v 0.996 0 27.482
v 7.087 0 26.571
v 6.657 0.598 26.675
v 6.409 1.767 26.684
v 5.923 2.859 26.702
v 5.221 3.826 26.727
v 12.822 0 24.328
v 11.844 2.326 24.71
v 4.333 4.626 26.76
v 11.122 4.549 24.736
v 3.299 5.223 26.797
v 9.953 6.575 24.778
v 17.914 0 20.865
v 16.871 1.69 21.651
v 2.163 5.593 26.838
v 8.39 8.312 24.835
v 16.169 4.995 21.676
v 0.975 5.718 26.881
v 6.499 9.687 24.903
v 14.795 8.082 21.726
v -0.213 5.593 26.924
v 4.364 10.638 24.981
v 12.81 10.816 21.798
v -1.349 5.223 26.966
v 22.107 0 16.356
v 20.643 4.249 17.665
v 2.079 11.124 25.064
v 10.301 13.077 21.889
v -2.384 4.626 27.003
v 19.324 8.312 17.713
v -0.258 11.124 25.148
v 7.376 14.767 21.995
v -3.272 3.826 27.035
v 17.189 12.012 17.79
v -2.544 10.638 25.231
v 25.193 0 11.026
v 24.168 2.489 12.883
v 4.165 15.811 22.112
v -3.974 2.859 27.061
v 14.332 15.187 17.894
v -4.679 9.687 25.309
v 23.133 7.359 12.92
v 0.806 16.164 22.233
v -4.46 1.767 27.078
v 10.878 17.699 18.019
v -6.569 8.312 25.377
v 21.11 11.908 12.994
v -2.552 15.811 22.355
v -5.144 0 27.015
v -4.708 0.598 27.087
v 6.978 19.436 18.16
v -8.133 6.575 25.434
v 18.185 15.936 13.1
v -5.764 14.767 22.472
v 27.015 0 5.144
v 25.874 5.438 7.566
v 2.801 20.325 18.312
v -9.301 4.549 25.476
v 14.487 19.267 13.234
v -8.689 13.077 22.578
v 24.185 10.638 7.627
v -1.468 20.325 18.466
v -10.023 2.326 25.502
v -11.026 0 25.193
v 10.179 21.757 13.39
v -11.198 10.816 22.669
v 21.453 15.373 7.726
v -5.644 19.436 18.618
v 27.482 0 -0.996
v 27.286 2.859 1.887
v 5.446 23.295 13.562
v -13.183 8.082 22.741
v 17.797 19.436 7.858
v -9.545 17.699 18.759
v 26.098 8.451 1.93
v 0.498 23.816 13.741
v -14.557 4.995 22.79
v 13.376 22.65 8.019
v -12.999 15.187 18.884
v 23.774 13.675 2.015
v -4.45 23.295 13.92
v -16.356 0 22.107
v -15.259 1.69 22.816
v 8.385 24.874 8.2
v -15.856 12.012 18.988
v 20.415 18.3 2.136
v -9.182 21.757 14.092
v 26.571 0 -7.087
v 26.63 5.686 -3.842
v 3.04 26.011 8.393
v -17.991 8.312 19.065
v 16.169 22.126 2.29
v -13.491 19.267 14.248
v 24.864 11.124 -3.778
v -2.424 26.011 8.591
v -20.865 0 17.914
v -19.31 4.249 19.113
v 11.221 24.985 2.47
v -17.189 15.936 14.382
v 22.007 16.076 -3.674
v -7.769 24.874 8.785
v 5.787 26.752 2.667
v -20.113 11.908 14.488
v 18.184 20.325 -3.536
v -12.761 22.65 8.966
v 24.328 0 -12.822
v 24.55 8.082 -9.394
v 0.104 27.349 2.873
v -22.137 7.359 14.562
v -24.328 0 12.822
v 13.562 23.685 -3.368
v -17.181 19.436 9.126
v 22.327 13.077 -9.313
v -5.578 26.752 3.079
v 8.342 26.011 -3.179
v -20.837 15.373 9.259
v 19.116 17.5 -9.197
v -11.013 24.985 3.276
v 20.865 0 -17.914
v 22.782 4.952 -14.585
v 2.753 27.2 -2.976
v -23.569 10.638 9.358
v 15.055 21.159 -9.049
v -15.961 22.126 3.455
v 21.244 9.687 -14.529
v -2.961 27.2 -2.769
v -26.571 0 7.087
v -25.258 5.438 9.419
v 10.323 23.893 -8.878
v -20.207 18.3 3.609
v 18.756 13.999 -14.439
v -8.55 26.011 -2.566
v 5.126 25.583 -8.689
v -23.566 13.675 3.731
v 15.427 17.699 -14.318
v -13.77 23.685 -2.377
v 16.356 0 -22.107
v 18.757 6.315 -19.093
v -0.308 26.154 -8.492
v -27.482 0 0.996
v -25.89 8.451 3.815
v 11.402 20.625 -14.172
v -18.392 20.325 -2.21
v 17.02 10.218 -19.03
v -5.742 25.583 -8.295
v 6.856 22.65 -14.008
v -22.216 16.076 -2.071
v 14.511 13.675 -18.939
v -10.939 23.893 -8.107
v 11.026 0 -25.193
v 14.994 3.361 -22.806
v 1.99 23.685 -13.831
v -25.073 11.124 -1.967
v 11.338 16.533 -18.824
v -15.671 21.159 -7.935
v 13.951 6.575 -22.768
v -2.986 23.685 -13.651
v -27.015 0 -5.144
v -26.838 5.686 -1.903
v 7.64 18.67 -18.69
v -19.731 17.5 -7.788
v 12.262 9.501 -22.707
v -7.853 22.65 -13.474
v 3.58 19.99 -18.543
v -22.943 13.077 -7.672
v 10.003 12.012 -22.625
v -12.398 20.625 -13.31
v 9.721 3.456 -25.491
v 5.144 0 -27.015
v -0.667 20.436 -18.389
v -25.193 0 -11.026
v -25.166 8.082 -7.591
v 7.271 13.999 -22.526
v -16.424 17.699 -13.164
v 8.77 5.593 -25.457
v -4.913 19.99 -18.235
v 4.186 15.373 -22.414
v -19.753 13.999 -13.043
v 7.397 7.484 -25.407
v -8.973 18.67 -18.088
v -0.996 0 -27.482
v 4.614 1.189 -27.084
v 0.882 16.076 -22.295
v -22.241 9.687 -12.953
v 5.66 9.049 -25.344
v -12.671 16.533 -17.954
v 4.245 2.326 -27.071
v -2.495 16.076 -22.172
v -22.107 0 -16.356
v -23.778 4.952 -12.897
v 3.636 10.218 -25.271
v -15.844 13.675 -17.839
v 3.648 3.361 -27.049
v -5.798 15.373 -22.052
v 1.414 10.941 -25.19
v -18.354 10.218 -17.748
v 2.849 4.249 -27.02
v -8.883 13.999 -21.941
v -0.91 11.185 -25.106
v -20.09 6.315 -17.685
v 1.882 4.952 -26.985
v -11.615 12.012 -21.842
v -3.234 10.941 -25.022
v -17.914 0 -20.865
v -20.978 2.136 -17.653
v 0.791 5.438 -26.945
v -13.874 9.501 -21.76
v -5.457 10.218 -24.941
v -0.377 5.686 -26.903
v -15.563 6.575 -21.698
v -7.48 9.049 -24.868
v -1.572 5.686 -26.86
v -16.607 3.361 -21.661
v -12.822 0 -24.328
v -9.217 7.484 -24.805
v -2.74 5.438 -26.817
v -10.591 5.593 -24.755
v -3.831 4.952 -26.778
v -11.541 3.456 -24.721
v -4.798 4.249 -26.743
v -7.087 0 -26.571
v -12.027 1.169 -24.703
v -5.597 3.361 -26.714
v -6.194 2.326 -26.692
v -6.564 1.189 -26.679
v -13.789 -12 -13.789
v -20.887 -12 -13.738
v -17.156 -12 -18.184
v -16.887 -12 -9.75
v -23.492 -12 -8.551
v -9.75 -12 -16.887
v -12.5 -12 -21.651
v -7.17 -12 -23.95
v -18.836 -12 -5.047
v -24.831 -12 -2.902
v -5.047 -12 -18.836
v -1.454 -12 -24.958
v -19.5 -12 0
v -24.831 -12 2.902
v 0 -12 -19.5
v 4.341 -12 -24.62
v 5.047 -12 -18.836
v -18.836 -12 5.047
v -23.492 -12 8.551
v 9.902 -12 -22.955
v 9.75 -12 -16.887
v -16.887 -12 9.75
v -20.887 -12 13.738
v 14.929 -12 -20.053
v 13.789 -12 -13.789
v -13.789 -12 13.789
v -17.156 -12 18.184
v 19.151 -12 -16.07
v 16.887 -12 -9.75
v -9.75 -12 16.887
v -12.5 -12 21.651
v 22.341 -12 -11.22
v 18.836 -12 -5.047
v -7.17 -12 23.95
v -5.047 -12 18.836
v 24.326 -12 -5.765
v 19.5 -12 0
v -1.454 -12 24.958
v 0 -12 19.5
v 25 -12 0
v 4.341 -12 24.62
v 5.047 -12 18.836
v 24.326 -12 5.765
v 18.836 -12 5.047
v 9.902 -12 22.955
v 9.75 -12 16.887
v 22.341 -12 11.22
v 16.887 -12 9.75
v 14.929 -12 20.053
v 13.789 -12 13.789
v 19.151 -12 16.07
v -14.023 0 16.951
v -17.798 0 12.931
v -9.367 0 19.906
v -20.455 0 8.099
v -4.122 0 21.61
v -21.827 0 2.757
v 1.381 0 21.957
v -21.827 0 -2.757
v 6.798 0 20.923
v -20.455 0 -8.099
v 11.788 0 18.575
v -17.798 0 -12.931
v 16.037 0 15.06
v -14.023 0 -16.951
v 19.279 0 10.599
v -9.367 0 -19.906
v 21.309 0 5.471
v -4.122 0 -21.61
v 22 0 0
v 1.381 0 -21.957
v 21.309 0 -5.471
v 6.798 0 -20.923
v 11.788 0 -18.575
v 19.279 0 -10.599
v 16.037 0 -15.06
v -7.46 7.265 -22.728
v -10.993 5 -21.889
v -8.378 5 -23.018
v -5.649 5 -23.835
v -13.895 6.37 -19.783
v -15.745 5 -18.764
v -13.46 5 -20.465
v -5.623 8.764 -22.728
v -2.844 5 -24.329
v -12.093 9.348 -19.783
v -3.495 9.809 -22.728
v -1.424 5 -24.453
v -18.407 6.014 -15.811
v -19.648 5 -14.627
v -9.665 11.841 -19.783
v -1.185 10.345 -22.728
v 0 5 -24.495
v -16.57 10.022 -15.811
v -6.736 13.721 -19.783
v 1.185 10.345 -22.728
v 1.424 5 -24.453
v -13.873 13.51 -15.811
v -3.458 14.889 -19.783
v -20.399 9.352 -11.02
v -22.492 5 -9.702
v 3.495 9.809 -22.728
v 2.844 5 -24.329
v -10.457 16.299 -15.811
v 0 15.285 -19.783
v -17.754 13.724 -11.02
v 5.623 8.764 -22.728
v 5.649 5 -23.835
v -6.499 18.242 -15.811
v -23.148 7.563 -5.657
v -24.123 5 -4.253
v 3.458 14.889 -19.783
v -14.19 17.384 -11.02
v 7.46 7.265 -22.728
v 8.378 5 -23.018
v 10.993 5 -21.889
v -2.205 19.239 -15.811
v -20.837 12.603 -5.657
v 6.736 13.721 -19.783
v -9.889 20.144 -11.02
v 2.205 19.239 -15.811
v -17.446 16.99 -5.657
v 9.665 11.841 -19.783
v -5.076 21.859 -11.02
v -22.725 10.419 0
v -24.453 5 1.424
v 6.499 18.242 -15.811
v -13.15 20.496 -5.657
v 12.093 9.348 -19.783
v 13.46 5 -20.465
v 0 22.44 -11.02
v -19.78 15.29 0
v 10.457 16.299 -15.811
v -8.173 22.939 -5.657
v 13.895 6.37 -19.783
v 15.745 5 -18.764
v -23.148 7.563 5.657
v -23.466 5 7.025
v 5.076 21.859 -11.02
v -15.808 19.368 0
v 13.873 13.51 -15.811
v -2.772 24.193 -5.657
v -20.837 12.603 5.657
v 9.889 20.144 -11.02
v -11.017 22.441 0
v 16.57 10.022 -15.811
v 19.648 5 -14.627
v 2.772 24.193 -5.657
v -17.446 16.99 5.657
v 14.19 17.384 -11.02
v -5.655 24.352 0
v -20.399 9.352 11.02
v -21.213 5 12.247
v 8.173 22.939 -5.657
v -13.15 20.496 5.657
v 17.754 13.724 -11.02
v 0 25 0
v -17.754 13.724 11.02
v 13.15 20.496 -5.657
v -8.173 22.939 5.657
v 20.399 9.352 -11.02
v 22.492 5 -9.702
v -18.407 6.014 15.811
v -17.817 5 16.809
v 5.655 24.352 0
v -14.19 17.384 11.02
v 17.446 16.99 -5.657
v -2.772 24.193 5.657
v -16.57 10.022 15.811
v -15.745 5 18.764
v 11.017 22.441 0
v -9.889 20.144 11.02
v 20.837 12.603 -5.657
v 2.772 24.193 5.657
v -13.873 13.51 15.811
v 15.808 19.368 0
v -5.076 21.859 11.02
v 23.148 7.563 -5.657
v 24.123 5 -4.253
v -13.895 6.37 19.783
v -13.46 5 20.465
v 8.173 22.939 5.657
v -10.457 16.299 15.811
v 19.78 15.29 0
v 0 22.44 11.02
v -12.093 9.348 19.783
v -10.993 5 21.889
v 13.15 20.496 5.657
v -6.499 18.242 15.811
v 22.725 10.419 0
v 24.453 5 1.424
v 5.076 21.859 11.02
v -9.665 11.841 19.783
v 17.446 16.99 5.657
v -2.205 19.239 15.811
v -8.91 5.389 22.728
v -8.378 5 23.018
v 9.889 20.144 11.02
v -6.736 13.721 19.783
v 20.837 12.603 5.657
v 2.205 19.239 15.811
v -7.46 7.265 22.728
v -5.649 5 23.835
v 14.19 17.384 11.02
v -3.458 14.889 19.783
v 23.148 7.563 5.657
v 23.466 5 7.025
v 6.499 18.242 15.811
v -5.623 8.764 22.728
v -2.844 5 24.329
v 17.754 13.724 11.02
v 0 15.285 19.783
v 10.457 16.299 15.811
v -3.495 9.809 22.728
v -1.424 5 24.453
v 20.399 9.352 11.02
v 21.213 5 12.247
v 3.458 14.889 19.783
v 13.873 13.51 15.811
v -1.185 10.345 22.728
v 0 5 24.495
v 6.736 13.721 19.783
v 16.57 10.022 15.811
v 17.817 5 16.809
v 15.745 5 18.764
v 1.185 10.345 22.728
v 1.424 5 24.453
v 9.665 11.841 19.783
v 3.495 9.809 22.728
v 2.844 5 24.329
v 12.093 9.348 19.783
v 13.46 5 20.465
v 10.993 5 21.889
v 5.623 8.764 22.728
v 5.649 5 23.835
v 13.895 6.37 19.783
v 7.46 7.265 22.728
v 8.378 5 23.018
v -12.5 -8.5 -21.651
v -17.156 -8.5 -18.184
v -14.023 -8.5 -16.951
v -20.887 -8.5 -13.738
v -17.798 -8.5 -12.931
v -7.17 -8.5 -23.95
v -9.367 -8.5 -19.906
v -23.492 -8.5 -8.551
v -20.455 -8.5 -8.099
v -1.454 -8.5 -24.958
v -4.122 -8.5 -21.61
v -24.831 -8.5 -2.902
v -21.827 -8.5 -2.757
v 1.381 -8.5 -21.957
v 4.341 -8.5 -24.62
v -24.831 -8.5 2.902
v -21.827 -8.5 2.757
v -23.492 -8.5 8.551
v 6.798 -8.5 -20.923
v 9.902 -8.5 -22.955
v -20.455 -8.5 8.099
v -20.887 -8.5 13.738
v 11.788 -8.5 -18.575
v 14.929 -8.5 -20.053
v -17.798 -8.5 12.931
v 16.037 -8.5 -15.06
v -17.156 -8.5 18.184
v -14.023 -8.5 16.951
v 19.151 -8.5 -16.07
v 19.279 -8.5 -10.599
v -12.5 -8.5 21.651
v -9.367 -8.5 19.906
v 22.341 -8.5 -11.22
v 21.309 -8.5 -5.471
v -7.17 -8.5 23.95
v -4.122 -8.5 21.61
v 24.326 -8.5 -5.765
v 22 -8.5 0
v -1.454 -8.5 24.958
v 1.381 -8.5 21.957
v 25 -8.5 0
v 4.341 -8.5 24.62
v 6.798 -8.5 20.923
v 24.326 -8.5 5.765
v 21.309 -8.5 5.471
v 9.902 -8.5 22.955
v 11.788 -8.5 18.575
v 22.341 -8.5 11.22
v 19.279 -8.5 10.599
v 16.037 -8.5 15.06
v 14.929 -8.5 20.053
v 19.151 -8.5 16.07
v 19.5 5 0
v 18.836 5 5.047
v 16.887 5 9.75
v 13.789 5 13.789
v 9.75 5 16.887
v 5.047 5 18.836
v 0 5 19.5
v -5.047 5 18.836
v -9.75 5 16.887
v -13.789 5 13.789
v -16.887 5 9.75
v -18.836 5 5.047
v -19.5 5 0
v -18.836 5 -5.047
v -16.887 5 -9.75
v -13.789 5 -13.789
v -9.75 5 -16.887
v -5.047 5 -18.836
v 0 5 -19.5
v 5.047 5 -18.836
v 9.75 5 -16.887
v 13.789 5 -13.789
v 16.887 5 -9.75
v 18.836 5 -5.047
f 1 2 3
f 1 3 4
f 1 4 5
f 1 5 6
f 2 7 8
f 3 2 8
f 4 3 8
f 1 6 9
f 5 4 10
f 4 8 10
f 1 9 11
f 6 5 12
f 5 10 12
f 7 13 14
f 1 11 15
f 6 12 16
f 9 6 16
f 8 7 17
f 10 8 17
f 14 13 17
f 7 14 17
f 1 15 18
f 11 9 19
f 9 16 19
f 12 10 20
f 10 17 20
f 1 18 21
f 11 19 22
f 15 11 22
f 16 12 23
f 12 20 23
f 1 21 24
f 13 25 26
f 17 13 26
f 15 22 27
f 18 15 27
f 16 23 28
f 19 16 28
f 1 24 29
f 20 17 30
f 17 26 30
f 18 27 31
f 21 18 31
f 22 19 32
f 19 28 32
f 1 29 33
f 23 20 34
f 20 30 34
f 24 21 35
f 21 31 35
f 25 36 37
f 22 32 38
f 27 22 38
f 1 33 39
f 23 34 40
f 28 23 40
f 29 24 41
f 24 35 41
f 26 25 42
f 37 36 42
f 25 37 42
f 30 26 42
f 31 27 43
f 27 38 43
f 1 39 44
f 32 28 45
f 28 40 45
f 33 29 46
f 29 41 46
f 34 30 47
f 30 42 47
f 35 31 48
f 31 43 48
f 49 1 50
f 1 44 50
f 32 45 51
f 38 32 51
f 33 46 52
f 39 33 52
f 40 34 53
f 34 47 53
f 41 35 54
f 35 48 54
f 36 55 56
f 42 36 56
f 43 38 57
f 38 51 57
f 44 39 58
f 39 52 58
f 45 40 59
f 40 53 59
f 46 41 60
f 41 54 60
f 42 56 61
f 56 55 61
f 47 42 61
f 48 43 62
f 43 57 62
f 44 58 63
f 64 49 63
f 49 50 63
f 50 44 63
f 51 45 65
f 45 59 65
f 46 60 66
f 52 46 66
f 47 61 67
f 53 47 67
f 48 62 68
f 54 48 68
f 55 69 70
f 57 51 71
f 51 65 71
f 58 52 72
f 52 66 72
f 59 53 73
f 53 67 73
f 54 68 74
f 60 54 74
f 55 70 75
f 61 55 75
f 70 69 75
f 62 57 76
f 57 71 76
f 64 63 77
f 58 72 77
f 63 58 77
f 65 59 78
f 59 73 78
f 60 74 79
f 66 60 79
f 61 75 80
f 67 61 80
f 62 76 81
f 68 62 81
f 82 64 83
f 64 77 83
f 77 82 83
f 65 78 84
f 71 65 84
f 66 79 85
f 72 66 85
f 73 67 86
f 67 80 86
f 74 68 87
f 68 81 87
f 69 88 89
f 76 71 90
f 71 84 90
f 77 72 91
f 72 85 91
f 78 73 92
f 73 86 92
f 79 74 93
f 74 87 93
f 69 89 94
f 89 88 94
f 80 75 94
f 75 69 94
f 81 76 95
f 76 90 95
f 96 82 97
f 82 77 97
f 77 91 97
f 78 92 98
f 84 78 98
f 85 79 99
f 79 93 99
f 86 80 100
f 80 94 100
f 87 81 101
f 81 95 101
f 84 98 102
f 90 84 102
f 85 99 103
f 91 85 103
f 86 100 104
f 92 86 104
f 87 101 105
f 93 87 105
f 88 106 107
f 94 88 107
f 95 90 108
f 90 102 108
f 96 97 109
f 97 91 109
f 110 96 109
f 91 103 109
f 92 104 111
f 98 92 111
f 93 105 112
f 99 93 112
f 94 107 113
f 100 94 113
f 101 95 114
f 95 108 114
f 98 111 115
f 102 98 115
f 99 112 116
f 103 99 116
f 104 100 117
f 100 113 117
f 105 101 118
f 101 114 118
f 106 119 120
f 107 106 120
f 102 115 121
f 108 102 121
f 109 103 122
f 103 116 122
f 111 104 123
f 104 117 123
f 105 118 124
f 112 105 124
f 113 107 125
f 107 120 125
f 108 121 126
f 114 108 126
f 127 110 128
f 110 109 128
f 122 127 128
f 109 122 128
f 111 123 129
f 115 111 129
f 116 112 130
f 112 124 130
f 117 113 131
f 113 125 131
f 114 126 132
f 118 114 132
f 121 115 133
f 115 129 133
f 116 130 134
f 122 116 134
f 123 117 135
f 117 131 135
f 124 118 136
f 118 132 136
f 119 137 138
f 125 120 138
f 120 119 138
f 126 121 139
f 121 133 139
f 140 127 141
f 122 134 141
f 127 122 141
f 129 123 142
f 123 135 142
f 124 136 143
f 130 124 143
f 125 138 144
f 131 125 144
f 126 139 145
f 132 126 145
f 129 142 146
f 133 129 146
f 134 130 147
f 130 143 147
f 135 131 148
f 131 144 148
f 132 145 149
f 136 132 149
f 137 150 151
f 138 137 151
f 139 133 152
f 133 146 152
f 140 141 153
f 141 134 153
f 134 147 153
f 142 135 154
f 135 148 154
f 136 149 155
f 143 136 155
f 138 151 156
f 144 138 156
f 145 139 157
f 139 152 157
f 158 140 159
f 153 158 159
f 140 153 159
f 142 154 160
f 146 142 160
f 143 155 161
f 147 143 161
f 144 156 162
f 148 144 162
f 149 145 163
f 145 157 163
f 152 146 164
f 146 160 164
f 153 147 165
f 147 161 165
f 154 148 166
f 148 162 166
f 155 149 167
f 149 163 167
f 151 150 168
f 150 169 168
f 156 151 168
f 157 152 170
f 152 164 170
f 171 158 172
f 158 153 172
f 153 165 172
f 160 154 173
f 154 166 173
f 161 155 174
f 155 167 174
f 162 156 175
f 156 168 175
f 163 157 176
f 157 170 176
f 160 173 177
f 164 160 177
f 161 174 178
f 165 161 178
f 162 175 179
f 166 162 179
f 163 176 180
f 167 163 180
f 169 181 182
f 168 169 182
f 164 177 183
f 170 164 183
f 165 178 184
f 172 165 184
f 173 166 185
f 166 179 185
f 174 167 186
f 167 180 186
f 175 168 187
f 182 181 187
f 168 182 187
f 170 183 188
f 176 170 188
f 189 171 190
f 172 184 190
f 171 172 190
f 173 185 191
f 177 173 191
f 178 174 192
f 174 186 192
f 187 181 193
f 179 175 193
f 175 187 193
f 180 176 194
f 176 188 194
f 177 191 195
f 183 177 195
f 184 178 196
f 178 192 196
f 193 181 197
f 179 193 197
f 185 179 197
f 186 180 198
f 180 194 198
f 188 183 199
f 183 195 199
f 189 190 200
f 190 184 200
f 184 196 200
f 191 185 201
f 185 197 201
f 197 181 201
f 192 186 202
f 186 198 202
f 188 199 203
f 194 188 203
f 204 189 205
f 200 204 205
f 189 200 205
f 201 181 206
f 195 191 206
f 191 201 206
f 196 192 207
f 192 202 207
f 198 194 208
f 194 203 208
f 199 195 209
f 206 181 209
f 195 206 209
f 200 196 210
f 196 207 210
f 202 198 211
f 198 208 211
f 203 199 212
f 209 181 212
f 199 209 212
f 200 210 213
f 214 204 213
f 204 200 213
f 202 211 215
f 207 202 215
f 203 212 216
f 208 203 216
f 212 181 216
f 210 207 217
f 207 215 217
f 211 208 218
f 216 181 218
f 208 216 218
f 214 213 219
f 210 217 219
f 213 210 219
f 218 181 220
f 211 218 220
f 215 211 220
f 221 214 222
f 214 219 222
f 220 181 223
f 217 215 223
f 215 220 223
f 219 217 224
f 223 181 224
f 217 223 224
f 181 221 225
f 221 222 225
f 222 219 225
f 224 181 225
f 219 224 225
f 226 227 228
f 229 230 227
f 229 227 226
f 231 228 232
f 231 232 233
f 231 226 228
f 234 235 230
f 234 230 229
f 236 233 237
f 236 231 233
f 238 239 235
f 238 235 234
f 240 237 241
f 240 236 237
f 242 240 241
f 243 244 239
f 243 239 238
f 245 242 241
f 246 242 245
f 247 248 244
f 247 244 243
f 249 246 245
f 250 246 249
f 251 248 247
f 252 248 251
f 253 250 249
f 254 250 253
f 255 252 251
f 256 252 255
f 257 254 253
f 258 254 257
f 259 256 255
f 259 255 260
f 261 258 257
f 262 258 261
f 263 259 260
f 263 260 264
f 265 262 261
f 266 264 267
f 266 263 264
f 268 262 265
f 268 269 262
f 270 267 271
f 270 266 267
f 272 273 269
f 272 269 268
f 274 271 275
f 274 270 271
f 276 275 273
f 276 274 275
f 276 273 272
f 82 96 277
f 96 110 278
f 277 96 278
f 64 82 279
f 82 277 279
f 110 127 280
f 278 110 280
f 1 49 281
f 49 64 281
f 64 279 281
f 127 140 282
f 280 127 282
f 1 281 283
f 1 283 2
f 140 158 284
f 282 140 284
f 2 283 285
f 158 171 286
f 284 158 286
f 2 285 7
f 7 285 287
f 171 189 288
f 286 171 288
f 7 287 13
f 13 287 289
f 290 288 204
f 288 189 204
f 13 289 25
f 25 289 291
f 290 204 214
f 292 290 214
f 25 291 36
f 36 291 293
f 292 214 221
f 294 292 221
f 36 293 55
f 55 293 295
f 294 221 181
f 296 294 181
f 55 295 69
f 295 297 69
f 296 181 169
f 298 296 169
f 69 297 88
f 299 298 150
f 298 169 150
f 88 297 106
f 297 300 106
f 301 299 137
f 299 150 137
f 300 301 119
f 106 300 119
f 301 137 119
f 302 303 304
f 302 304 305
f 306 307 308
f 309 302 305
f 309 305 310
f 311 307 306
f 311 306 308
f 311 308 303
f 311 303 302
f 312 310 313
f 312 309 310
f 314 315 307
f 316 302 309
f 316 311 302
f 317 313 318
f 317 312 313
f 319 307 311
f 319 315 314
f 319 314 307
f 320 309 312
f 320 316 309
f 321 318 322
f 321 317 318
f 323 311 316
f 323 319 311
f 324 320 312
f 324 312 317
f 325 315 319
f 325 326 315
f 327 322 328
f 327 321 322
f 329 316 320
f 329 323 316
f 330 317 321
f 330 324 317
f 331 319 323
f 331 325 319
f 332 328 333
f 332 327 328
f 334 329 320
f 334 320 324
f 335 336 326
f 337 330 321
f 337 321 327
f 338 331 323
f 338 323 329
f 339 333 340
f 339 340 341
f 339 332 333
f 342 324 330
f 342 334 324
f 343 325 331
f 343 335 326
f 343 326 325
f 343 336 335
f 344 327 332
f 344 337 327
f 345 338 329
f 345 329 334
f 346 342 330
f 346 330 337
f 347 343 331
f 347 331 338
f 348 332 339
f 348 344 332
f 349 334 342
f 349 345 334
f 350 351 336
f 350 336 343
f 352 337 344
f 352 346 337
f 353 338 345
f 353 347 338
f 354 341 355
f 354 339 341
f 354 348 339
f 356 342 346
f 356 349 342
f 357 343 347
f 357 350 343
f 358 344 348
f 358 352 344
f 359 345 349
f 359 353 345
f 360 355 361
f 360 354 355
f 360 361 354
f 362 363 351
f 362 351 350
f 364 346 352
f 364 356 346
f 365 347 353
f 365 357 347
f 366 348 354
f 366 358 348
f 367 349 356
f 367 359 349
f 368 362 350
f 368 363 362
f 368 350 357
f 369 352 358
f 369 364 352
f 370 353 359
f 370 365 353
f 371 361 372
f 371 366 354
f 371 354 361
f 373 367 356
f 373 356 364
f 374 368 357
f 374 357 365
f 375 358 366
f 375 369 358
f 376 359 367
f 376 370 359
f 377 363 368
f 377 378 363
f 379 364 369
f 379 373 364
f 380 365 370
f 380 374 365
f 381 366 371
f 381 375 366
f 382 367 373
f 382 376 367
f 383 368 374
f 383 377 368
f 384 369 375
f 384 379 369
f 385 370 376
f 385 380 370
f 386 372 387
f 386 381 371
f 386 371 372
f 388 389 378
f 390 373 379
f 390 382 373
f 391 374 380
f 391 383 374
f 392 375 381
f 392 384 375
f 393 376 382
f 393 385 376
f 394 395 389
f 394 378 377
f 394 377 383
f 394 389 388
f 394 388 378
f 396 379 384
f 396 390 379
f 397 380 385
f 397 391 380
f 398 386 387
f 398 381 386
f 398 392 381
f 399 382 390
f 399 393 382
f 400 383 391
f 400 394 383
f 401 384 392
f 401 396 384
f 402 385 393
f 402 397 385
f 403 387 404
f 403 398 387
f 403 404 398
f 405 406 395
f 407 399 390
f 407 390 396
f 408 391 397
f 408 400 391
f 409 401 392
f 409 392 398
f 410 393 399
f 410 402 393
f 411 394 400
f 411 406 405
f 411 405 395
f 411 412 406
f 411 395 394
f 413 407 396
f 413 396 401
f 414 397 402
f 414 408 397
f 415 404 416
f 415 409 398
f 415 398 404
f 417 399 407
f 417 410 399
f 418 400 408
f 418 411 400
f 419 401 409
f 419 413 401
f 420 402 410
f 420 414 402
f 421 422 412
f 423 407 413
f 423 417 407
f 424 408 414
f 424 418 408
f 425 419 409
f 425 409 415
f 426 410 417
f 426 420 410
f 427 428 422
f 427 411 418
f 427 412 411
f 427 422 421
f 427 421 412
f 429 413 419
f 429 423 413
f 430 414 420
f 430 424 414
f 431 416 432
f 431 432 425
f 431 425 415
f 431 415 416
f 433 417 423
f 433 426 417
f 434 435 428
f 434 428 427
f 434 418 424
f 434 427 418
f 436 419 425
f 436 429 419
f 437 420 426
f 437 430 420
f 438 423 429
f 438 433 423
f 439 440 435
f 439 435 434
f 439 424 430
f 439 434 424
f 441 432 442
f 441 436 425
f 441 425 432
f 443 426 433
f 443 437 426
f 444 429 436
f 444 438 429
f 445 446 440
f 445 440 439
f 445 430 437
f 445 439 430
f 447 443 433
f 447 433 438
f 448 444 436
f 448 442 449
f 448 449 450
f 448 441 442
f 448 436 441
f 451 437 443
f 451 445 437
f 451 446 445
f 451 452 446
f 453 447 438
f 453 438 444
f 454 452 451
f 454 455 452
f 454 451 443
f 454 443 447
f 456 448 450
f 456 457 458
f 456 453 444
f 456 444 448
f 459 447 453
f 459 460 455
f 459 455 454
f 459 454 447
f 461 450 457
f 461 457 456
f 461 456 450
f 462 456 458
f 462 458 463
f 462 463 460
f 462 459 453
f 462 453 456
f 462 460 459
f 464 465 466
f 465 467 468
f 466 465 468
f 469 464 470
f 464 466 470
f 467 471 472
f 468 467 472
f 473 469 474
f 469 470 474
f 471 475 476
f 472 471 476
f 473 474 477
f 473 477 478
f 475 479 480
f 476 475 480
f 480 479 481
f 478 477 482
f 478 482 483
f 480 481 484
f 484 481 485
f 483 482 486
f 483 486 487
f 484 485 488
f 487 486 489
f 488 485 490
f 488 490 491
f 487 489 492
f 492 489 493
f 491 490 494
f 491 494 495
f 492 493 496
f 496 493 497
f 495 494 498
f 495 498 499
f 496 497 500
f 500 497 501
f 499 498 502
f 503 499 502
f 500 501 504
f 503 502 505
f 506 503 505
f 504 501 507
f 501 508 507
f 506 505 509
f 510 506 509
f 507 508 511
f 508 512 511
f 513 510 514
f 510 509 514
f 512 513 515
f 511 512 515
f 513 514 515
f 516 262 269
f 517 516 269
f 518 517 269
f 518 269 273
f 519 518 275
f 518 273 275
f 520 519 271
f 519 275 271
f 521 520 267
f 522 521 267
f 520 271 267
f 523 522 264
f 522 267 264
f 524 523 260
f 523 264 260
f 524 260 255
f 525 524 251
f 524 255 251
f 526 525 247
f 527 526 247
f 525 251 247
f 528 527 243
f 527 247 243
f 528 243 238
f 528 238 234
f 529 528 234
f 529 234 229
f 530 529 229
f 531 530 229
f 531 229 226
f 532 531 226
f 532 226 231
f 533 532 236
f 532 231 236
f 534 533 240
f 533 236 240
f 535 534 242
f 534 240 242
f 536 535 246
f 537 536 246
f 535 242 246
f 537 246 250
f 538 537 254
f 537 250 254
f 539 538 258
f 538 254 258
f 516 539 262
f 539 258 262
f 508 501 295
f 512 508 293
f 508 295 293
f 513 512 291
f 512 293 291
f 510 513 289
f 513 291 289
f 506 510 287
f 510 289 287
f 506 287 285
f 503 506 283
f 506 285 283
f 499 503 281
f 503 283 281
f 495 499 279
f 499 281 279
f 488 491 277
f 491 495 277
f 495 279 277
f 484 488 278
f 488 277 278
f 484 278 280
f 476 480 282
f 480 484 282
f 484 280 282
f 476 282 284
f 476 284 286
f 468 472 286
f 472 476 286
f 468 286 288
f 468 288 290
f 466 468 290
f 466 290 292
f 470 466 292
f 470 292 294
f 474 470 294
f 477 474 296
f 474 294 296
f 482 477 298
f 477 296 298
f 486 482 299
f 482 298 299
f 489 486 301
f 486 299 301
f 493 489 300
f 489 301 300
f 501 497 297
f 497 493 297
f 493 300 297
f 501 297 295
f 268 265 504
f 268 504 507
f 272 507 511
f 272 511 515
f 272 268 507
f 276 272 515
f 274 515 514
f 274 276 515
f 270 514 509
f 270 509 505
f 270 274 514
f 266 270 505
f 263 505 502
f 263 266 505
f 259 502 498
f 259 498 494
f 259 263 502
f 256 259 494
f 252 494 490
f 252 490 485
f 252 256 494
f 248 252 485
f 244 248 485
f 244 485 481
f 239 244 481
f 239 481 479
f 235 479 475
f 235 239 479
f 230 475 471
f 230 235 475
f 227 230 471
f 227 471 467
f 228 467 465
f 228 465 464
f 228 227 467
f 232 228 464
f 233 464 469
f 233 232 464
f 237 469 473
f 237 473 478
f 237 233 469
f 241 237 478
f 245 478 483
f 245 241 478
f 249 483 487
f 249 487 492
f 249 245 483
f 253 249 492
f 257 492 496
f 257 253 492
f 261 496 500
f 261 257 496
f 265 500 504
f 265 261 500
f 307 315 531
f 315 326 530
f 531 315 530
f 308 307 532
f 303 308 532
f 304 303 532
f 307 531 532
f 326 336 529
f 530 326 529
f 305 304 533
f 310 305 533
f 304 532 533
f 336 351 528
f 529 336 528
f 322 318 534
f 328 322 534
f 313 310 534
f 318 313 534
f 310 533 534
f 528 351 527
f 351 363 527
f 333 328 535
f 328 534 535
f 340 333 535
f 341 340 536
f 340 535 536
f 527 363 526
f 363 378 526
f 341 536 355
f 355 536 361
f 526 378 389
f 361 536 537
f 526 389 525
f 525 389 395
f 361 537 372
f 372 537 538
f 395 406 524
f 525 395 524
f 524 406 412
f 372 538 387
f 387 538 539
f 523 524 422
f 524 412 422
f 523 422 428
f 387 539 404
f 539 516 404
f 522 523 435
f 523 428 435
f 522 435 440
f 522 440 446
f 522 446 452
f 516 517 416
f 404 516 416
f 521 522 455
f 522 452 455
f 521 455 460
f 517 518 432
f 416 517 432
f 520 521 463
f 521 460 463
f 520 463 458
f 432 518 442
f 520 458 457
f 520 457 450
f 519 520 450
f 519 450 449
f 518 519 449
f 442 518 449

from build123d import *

# Parameters (mm, degrees)
REVOLVE1_ANGLE      = 180
SKETCH3_R           = 25.457715114
BOSS_EXTRUDE1_DEPTH = 5
SKETCH4_R           = 22
BOSS_EXTRUDE2_DEPTH = 12
SKETCH5_R           = 25
BOSS_EXTRUDE3_DEPTH = 3.5
SKETCH6_R           = 19.5
CUT_EXTRUDE1_DEPTH  = 17


with BuildPart() as part:
    # Sketch1 → Revolve1 (revolve)
    with BuildSketch(Plane(origin=(0, 0, 0), x_dir=(1, 0, 0), z_dir=(0, 1, 0))):
        with BuildLine():
            Line((-0.996315138, 27.481946004), (0.996315138, -27.481946004))
            ThreePointArc((0.996315138, -27.481946004), (27.481946004, 0.996315138), (-0.996315138, 27.481946004))
        make_face()
    revolve(axis=Axis((-0.996315138, 0, -27.481946004), (0.036229641, 0, 0.999343491)), revolution_arc=REVOLVE1_ANGLE)

    # Sketch2 → Cut-Revolve1 (revolve, cut)
    with BuildSketch(Plane.XZ):
        with BuildLine():
            Line((0, 25), (0, -25))
            ThreePointArc((0, -25), (25, 0), (0, 25))
        make_face()
    revolve(axis=Axis((0, 0, 25), (0, 0, -1)), mode=Mode.SUBTRACT)

    # Sketch3 → Boss-Extrude1 (add)
    with BuildSketch(Plane.XZ):
        Circle(SKETCH3_R)
    extrude(amount=-BOSS_EXTRUDE1_DEPTH)

    # Sketch4 → Boss-Extrude2 (add)
    with BuildSketch(Plane.XZ):
        Circle(SKETCH4_R)
    extrude(amount=BOSS_EXTRUDE2_DEPTH)

    # Sketch5 → Boss-Extrude3 (add)
    with BuildSketch(Plane.XZ.offset(12)):
        Circle(SKETCH5_R)
    extrude(amount=-BOSS_EXTRUDE3_DEPTH)

    # Sketch6 → Cut-Extrude1 (cut)
    with BuildSketch(Plane.XZ.offset(12)):
        Circle(SKETCH6_R)
    extrude(amount=-CUT_EXTRUDE1_DEPTH, mode=Mode.SUBTRACT)


solid = part.part
